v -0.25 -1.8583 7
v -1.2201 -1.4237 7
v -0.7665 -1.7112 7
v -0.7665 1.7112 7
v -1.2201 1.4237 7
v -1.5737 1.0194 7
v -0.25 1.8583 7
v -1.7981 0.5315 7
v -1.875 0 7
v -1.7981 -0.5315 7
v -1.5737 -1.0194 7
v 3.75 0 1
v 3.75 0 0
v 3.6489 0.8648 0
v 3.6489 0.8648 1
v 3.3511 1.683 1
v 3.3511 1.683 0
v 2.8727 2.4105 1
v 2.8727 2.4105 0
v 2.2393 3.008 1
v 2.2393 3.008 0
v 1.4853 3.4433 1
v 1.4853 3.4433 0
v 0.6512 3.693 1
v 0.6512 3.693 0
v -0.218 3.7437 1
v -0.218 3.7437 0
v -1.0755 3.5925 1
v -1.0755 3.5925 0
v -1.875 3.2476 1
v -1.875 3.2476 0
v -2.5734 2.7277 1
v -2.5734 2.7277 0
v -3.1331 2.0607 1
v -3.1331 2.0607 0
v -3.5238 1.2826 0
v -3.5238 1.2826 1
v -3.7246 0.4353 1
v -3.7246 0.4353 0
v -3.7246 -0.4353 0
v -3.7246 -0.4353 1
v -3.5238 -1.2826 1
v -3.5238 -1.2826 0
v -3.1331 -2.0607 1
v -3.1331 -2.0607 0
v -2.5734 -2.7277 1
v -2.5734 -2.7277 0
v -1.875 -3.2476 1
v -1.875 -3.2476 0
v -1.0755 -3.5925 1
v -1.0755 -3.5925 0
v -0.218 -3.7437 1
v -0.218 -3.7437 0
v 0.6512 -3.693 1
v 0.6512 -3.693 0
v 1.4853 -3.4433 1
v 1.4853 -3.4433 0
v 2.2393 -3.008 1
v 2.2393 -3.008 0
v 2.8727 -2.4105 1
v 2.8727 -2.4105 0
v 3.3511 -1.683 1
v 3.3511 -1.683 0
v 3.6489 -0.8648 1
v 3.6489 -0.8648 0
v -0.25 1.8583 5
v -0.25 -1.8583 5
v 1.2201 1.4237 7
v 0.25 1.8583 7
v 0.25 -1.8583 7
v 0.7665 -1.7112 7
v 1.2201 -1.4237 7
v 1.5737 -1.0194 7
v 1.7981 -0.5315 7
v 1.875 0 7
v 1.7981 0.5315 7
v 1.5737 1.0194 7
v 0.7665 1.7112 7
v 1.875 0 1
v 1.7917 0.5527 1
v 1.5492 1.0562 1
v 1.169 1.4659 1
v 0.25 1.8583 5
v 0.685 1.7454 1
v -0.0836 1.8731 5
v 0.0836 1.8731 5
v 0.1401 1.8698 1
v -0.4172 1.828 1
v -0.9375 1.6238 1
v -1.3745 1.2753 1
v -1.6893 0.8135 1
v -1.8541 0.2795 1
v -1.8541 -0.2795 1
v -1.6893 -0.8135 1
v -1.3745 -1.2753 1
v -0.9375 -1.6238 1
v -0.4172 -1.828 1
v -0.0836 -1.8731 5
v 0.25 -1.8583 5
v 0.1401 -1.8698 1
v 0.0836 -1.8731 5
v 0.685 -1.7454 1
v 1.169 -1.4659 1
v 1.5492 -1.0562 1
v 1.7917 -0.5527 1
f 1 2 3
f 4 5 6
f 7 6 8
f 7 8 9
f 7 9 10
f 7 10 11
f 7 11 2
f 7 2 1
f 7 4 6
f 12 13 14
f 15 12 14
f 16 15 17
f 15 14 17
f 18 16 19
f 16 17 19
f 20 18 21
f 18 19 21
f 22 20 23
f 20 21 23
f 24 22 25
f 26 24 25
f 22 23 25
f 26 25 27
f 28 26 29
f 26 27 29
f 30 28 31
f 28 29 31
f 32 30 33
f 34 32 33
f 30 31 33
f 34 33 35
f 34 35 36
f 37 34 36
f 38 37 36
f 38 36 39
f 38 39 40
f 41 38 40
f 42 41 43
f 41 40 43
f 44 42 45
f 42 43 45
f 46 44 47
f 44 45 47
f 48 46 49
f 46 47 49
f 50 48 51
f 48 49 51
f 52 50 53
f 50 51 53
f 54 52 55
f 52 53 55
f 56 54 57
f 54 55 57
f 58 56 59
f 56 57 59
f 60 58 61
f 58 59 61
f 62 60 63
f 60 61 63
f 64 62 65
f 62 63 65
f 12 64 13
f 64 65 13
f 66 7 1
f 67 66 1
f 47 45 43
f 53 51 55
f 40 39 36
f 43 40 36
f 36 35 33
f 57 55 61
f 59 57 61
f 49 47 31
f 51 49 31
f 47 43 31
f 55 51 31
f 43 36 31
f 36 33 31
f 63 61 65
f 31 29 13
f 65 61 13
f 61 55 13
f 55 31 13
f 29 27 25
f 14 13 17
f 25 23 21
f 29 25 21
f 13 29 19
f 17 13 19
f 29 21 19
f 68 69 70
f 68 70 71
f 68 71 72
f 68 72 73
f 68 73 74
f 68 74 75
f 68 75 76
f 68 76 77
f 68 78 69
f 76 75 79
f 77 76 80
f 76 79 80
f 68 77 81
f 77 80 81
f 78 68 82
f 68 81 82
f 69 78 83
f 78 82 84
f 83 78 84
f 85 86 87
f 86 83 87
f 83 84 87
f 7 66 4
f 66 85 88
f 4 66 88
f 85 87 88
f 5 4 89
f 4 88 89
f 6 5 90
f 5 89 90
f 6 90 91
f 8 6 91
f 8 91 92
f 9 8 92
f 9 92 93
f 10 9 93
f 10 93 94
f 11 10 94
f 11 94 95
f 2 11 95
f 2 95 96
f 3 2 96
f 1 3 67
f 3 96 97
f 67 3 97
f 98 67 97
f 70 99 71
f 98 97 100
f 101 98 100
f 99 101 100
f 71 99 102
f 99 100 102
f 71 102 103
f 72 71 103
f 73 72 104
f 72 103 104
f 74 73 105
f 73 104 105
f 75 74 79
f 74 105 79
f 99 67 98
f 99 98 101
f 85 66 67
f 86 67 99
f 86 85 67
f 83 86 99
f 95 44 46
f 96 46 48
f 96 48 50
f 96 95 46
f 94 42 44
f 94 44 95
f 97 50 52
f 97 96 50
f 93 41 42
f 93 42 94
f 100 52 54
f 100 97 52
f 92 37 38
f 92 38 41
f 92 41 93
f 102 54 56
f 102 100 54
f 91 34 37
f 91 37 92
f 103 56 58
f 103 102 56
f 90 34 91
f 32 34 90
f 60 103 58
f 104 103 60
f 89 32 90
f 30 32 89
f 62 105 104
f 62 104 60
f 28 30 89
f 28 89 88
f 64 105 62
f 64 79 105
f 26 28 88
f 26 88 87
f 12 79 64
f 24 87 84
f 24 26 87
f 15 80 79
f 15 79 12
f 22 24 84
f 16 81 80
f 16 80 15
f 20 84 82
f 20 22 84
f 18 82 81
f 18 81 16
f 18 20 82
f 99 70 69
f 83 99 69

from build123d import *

# Parameters (mm, degrees)
F0_R     = 1.875
F1_DEPTH = 7
F0_R_2   = 3.75
F2_DEPTH = 1
F4_DEPTH = 2


with BuildPart() as f1:
    # F0 (on Top) → F1 (new body)
    with BuildSketch(Plane.XY):
        Circle(F0_R)
    extrude(amount=F1_DEPTH)

    # F0 (on Top) → F2 (join)
    with BuildSketch(Plane.XY):
        Circle(F0_R_2)
        Circle(F0_R, mode=Mode.SUBTRACT)
    extrude(amount=F2_DEPTH)

    # F3 (on face) → F4 (cut)
    with BuildSketch(Plane.XY.offset(7)):
        with BuildLine():
            Line((-0.25, 1.8582585934), (-0.25, -1.8582585934))
            ThreePointArc((-0.25, -1.8582585934), (0, -1.875), (0.25, -1.8582585934))
            Line((0.25, -1.8582585934), (0.25, 1.8582585934))
            ThreePointArc((0.25, 1.8582585934), (0, 1.875), (-0.25, 1.8582585934))
        make_face()
        with BuildLine():
            Line((-0.25, 2.5), (-0.25, 1.8582585934))
            ThreePointArc((-0.25, 1.8582585934), (0, 1.875), (0.25, 1.8582585934))
            Line((0.25, 1.8582585934), (0.25, 2.5))
            Line((0.25, 2.5), (-0.25, 2.5))
        make_face()
    extrude(amount=-F4_DEPTH, mode=Mode.SUBTRACT)


solid = f1.part
